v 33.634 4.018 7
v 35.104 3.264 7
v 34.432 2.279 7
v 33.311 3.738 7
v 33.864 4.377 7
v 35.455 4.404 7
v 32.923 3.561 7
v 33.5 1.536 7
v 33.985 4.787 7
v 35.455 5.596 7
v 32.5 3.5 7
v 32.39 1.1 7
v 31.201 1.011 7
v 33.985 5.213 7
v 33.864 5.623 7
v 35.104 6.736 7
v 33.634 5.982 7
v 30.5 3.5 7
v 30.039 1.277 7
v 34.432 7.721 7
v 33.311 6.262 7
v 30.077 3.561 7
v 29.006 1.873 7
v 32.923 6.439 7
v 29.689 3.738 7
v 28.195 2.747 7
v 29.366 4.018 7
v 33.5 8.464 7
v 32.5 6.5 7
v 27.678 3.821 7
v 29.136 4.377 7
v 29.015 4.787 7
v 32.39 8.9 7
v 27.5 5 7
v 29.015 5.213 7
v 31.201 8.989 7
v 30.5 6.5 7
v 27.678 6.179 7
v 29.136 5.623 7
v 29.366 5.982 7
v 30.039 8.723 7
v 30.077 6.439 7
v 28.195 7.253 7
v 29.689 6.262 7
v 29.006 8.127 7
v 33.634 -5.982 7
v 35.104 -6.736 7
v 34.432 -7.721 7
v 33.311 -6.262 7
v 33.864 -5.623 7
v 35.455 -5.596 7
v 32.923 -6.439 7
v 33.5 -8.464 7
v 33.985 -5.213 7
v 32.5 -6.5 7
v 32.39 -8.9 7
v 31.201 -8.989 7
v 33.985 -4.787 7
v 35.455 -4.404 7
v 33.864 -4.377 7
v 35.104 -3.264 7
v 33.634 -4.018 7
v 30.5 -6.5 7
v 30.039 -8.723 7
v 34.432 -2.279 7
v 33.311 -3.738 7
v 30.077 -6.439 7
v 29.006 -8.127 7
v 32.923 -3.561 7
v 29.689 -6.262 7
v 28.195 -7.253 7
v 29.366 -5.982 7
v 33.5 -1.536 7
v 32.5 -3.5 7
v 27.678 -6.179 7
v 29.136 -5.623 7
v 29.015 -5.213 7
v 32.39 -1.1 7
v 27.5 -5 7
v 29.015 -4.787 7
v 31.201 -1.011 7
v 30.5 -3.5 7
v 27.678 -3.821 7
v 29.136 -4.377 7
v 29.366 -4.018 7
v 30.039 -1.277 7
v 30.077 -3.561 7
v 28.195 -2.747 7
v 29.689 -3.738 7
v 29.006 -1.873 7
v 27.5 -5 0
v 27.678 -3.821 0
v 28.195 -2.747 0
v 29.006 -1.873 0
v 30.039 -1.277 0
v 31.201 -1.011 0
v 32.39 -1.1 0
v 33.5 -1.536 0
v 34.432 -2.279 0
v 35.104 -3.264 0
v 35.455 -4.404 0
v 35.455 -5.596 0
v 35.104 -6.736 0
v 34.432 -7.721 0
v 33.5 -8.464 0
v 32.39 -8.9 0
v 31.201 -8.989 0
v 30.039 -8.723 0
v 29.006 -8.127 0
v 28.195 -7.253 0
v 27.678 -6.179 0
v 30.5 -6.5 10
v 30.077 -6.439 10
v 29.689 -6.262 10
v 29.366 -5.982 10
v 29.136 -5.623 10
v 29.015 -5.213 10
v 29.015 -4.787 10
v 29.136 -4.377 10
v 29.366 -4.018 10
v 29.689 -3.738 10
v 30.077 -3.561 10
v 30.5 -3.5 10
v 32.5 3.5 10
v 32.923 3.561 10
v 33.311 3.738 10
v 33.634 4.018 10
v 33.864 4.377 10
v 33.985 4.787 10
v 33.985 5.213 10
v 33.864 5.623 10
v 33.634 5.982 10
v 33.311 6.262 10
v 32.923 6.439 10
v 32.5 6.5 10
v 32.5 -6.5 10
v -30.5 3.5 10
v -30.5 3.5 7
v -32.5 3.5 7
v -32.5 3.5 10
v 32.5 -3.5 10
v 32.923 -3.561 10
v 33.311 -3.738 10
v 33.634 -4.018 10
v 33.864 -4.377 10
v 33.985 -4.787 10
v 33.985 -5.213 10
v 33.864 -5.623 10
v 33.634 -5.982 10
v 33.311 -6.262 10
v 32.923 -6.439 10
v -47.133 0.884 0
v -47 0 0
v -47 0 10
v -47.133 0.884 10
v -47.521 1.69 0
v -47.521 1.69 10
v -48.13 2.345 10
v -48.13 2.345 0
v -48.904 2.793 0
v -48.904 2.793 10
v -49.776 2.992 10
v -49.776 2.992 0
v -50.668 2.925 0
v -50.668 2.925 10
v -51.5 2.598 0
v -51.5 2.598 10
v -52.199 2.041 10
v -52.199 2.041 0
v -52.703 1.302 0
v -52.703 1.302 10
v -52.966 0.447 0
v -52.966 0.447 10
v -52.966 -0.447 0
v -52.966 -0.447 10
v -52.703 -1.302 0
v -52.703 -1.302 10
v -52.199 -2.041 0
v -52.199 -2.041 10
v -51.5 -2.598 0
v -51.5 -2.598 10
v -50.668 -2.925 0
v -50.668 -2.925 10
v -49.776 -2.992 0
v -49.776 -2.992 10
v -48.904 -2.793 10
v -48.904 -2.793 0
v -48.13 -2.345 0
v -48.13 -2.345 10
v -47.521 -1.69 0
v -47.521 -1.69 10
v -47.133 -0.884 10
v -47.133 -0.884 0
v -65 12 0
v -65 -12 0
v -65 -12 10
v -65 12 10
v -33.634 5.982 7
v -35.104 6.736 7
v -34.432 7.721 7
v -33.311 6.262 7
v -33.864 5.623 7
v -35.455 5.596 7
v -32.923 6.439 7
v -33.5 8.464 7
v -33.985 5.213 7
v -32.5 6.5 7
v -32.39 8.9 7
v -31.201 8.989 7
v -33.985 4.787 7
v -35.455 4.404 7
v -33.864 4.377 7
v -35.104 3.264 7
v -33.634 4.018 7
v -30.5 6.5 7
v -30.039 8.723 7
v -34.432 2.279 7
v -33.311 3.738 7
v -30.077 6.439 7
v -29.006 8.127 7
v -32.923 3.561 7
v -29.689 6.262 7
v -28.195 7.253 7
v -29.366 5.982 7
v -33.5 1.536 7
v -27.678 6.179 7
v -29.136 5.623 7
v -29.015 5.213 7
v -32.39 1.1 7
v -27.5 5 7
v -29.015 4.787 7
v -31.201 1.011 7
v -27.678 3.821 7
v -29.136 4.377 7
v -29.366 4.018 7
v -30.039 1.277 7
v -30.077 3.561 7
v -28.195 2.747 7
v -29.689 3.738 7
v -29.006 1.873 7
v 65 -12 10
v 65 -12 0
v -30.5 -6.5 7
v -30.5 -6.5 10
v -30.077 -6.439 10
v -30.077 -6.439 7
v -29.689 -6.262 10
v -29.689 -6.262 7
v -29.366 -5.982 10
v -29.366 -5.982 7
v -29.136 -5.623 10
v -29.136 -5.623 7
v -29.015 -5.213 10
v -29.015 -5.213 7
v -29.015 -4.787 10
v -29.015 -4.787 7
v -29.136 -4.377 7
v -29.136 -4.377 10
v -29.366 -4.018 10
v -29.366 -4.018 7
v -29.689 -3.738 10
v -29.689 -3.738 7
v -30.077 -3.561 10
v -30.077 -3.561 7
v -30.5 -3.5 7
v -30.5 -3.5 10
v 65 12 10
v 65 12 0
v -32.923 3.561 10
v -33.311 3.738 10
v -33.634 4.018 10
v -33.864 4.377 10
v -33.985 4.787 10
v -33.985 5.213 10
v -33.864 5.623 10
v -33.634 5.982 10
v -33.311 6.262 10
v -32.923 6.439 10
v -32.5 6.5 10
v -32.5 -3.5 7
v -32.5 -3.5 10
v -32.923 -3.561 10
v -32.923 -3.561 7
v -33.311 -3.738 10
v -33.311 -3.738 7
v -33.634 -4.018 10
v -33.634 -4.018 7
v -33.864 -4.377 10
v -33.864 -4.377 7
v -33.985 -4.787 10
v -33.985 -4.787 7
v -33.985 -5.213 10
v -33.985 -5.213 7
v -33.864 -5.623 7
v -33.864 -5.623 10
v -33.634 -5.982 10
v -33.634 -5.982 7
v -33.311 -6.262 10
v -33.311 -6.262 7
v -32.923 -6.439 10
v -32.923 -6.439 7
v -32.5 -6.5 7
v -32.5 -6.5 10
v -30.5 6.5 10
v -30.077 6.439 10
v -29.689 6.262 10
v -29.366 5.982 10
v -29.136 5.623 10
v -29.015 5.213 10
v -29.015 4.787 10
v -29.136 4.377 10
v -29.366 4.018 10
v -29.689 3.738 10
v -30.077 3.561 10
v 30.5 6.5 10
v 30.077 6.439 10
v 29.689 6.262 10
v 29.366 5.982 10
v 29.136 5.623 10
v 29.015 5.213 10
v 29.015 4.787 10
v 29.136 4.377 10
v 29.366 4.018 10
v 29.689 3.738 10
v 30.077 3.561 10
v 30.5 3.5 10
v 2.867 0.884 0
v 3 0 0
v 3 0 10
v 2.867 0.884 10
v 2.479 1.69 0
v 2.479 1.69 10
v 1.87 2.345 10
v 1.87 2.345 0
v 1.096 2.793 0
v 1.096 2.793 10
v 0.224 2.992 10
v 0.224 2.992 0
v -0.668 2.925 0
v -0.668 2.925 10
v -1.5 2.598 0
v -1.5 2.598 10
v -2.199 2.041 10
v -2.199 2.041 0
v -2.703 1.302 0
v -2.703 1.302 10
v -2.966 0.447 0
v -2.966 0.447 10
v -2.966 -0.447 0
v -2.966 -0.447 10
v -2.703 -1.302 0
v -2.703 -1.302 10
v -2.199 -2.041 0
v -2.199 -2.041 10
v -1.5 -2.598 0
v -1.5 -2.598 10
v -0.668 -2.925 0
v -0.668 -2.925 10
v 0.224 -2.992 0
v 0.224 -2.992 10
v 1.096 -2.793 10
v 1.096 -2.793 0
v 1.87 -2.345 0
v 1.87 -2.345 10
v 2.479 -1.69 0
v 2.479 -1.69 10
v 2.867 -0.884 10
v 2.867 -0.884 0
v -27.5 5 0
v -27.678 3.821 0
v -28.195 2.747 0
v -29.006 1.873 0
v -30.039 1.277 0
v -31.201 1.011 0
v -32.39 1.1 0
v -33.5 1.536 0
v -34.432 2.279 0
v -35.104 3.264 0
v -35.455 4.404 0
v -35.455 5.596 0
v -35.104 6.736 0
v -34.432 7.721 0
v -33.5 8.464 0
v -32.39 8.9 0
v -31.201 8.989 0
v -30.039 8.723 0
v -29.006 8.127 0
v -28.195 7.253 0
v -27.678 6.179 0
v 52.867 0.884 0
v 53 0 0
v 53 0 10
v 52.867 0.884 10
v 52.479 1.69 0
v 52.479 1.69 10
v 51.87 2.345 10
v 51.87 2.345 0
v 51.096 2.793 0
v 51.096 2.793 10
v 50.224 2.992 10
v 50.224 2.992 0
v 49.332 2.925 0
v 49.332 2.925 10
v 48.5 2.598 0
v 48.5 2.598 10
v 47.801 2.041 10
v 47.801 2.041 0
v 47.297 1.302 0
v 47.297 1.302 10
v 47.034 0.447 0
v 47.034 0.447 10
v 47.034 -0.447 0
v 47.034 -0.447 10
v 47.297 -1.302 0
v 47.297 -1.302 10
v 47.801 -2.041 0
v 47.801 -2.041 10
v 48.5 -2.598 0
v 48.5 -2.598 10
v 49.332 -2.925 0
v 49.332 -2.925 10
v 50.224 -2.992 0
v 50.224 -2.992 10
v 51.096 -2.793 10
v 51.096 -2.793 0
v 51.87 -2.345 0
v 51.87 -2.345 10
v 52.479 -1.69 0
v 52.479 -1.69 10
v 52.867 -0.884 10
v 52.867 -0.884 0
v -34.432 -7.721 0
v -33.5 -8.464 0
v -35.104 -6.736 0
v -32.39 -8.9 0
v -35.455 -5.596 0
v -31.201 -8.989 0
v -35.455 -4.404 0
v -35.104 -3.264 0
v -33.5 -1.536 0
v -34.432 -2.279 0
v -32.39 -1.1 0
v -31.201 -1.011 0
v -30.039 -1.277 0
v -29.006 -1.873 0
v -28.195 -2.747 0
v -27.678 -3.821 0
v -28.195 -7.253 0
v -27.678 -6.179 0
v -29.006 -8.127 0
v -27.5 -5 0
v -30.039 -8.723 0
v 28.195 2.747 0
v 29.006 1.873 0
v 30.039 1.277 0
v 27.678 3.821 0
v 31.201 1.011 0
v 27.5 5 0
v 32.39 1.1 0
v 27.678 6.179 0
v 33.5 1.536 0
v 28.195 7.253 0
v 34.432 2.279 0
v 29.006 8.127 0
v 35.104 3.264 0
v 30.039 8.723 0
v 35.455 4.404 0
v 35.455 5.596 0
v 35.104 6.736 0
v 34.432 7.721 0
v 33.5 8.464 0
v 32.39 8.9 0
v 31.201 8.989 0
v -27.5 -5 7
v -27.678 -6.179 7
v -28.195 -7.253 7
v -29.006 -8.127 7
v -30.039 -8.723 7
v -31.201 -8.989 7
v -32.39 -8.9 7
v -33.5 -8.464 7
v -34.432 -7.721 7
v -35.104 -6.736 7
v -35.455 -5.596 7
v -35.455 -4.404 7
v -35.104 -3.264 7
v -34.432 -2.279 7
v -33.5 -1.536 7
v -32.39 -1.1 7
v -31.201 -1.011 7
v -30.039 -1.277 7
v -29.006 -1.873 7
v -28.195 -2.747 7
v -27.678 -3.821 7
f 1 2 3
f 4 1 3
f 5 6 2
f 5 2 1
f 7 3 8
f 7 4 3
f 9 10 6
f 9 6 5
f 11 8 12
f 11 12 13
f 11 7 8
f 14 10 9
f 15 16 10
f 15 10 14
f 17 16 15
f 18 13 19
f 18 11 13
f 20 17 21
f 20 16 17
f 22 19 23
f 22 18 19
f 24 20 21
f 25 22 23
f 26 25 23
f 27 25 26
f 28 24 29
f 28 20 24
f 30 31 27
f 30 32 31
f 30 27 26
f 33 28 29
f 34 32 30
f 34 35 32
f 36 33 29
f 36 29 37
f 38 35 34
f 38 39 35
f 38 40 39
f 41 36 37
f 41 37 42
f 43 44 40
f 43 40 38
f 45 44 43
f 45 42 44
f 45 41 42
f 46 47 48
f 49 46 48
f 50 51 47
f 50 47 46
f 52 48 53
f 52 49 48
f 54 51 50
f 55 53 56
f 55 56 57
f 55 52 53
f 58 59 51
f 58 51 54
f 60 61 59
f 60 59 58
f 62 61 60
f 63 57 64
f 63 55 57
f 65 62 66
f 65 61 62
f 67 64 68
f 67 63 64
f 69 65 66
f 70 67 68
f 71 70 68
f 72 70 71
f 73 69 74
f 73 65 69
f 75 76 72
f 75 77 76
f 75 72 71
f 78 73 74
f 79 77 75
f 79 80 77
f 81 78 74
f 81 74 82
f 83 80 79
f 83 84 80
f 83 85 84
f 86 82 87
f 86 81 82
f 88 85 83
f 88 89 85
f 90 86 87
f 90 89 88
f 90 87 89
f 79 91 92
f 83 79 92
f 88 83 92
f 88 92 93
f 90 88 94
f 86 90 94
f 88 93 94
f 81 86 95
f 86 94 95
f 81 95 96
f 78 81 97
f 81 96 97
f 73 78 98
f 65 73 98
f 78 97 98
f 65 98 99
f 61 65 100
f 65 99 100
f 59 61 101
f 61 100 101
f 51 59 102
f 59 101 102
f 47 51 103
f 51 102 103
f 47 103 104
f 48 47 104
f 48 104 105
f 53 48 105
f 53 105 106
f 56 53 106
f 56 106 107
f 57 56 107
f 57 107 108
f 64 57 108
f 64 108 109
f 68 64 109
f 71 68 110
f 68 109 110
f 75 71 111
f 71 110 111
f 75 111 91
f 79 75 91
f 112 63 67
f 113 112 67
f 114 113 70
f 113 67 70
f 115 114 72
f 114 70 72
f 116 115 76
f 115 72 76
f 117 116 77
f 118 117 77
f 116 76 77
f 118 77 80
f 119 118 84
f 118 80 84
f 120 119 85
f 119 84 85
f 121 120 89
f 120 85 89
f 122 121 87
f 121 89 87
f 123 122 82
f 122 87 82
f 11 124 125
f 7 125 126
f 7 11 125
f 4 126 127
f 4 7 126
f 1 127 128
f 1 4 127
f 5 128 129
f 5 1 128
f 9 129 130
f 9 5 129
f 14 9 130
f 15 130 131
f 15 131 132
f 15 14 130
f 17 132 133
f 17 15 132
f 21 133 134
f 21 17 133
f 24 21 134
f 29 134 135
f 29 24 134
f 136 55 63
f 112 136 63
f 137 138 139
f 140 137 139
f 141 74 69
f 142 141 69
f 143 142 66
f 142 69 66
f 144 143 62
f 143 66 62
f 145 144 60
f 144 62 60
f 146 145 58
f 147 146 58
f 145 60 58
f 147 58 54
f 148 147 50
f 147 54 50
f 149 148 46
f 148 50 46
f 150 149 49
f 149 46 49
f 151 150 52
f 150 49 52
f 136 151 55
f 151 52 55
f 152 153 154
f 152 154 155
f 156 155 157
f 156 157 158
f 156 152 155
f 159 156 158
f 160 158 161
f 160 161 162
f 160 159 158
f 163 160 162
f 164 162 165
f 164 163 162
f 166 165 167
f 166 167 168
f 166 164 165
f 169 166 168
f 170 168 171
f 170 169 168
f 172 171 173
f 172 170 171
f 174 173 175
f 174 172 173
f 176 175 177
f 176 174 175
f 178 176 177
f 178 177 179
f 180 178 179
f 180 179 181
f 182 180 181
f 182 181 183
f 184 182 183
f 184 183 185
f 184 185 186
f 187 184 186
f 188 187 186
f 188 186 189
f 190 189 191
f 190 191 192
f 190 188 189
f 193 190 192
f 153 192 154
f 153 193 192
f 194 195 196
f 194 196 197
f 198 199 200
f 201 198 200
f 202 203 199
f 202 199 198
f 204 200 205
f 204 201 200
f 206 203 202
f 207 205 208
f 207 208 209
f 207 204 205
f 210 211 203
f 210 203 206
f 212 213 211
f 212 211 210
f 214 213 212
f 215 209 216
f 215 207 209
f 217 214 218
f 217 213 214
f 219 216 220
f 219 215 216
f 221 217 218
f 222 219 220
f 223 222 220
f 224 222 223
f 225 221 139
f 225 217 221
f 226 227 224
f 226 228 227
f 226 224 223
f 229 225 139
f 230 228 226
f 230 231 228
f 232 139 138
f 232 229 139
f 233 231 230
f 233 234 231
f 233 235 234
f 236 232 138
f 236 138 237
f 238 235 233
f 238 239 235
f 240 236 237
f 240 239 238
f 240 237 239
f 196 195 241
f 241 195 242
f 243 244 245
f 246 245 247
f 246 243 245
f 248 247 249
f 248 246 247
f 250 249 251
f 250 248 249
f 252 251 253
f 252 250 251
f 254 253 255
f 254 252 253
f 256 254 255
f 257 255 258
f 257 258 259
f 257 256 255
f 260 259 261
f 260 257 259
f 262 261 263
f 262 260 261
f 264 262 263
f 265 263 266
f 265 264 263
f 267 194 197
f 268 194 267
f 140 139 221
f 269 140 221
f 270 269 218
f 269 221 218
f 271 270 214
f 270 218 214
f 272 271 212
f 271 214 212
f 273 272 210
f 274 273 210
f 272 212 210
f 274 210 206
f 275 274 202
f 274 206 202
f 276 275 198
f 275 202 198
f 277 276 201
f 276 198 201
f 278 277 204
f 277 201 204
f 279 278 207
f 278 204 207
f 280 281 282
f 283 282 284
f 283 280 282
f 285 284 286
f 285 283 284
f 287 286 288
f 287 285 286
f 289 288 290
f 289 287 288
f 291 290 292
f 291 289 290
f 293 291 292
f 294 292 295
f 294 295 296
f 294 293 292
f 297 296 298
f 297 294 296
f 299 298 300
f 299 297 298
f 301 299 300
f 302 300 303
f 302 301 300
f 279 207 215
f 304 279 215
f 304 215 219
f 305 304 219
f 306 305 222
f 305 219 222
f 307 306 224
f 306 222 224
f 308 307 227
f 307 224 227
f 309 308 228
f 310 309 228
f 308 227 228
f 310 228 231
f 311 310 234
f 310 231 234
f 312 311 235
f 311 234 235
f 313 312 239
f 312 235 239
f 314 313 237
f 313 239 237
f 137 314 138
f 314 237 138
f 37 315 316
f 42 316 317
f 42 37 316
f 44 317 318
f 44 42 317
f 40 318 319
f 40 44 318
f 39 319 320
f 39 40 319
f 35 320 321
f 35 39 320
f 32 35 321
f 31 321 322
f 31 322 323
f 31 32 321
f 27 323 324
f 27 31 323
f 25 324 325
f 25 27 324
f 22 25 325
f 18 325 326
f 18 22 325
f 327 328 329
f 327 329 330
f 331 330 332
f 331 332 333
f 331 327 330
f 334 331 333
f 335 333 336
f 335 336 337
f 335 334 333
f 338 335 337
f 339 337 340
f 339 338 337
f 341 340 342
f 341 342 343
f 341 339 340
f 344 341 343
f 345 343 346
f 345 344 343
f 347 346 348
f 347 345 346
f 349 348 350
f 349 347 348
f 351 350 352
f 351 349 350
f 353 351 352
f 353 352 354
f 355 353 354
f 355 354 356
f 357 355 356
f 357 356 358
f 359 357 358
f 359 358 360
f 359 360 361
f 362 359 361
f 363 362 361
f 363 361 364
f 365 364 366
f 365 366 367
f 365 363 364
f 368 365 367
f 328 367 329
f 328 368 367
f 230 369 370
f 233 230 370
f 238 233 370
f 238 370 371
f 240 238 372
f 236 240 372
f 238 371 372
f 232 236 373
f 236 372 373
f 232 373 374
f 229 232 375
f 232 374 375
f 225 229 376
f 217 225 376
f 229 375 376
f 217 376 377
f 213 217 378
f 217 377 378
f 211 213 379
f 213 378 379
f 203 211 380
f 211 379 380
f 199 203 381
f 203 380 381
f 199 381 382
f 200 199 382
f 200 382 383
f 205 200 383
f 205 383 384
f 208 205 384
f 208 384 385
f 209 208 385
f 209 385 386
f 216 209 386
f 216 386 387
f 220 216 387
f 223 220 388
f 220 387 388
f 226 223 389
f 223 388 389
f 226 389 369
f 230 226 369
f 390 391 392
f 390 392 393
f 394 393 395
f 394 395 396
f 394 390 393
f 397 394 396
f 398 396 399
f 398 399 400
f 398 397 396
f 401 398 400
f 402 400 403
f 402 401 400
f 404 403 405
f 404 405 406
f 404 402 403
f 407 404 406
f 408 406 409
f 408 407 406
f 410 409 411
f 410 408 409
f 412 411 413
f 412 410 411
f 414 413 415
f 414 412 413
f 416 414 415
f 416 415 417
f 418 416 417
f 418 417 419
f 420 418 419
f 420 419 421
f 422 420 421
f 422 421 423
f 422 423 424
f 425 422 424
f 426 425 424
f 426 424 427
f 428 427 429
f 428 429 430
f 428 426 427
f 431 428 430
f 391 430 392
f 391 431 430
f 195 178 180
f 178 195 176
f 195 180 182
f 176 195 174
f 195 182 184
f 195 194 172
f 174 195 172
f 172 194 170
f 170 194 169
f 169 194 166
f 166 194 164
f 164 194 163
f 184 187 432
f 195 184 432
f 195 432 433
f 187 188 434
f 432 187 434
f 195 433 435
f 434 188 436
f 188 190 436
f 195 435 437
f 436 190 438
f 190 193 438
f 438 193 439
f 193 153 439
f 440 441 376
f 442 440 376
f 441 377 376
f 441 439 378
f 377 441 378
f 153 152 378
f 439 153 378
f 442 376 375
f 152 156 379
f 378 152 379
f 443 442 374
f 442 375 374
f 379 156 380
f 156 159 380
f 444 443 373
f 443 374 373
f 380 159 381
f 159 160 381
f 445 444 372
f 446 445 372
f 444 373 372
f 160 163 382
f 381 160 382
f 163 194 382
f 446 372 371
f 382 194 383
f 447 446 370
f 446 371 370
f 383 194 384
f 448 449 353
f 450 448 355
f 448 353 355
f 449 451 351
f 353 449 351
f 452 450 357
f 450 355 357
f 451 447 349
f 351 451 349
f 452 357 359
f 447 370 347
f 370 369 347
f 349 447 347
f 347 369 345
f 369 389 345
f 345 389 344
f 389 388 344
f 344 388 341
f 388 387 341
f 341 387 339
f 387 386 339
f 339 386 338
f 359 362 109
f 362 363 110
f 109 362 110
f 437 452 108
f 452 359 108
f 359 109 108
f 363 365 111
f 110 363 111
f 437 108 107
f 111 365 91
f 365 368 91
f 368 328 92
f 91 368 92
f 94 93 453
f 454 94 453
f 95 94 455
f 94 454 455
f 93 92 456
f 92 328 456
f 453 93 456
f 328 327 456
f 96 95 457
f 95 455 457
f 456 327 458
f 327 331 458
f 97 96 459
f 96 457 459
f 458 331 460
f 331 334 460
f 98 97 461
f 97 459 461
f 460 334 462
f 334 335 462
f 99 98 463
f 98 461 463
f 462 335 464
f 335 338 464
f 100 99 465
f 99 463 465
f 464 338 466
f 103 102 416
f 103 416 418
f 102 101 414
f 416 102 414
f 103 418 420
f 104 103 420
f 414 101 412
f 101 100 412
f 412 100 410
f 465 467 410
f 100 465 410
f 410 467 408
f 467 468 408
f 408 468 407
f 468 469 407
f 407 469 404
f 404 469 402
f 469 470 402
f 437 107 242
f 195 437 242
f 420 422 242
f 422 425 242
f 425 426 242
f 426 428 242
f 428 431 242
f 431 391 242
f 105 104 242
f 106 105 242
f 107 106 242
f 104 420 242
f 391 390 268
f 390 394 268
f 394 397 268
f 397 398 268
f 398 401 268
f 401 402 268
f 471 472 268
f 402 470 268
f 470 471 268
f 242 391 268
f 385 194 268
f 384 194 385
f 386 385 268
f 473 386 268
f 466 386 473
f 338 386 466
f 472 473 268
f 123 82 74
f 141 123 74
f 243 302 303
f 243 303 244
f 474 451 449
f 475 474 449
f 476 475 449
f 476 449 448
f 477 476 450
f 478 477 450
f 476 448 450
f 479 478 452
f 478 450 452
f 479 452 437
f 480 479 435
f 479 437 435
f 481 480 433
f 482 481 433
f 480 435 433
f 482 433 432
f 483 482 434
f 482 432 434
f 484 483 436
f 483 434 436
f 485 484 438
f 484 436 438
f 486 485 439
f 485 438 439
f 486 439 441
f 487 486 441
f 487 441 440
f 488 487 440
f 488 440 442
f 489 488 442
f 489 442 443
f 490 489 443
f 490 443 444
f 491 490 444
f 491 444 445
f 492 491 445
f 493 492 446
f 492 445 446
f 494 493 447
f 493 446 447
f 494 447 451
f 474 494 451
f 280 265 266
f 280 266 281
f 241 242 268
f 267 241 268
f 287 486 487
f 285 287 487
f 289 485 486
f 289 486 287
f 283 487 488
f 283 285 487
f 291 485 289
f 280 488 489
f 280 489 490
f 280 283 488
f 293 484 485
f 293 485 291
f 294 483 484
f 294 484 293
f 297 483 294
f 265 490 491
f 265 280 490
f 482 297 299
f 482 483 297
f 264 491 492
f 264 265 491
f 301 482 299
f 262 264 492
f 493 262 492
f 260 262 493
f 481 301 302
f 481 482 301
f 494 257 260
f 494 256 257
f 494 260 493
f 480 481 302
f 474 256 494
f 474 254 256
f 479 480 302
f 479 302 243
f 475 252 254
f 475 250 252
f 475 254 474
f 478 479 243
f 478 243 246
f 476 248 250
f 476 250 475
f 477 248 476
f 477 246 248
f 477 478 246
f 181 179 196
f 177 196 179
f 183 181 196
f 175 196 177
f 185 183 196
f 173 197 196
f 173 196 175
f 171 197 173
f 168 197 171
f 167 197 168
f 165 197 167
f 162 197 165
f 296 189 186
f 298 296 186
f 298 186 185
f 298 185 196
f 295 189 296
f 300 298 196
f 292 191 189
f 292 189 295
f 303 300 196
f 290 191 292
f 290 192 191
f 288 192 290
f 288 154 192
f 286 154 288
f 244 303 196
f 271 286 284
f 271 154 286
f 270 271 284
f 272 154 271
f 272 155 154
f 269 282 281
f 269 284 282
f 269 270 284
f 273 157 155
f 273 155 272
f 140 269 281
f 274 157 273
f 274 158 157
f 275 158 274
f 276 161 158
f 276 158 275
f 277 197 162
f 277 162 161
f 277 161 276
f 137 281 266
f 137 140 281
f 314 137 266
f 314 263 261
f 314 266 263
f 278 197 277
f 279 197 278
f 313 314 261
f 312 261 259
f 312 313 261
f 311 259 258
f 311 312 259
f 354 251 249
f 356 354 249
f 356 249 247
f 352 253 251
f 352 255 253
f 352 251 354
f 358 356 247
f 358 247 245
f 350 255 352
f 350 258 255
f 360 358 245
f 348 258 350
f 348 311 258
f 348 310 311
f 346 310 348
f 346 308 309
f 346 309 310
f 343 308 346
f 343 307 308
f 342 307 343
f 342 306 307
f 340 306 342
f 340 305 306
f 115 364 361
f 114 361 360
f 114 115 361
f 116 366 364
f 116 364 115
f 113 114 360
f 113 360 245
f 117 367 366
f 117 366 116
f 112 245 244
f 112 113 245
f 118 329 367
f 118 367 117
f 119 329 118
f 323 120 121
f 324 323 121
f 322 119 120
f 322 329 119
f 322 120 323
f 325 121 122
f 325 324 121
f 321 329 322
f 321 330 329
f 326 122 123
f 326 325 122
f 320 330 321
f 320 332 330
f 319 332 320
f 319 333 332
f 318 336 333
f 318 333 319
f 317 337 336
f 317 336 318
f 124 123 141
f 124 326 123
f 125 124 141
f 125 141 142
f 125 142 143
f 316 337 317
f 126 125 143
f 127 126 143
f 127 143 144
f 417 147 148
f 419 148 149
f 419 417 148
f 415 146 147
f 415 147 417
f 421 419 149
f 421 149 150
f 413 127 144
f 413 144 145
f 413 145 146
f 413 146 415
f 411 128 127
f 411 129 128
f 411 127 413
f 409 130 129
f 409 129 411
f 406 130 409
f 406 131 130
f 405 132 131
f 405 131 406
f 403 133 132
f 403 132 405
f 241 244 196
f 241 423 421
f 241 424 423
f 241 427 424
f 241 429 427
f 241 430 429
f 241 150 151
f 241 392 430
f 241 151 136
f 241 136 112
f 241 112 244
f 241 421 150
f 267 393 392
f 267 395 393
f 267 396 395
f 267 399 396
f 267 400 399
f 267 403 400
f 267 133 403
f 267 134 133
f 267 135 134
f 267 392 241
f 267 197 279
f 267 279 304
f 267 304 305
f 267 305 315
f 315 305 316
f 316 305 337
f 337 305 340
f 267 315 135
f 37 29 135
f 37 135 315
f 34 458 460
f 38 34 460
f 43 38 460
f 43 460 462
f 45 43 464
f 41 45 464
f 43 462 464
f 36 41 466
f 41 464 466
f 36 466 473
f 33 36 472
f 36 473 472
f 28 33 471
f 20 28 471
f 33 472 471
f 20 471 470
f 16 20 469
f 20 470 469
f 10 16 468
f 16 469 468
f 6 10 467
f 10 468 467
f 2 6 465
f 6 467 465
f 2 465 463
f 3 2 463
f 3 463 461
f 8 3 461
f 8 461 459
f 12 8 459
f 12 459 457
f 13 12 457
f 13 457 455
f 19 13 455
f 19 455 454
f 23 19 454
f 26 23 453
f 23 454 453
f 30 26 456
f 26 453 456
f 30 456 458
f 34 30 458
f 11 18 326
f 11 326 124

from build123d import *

# Parameters (mm, degrees)
SKETCH_1_W          = 130
SKETCH_1_H          = 24
SKETCH_1_R          = 3
EXTRUDE_1_DEPTH     = 10
SKETCH_2_R          = 4
CUT_EXTRUDE_1_DEPTH = 7


with BuildPart() as part:
    # 草图1 → 凸台-拉伸1 (new body)
    with BuildSketch(Plane.XY):
        Rectangle(SKETCH_1_W, SKETCH_1_H)
        with Locations((-50, 0)):
            Circle(SKETCH_1_R, mode=Mode.SUBTRACT)
        with Locations((50, 0)):
            Circle(SKETCH_1_R, mode=Mode.SUBTRACT)
        Circle(SKETCH_1_R, mode=Mode.SUBTRACT)
        with BuildLine():
            Line((32.5, 6.5), (30.5, 6.5))
            ThreePointArc((30.5, 6.5), (29, 5), (30.5, 3.5))
            Line((30.5, 3.5), (32.5, 3.5))
            ThreePointArc((32.5, 3.5), (34, 5), (32.5, 6.5))
        make_face(mode=Mode.SUBTRACT)
        with BuildLine():
            Line((32.5, -6.5), (30.5, -6.5))
            ThreePointArc((30.5, -6.5), (29, -5), (30.5, -3.5))
            Line((30.5, -3.5), (32.5, -3.5))
            ThreePointArc((32.5, -3.5), (34, -5), (32.5, -6.5))
        make_face(mode=Mode.SUBTRACT)
        with BuildLine():
            Line((-32.5, 6.5), (-30.5, 6.5))
            ThreePointArc((-30.5, 6.5), (-29, 5), (-30.5, 3.5))
            Line((-30.5, 3.5), (-32.5, 3.5))
            ThreePointArc((-32.5, 3.5), (-34, 5), (-32.5, 6.5))
        make_face(mode=Mode.SUBTRACT)
        with BuildLine():
            Line((-32.5, -6.5), (-30.5, -6.5))
            ThreePointArc((-30.5, -6.5), (-29, -5), (-30.5, -3.5))
            Line((-30.5, -3.5), (-32.5, -3.5))
            ThreePointArc((-32.5, -3.5), (-34, -5), (-32.5, -6.5))
        make_face(mode=Mode.SUBTRACT)
    extrude(amount=EXTRUDE_1_DEPTH)

    # 草图2 → 切除-拉伸1 (cut)
    with BuildSketch(Plane(origin=(0, 0, 0), x_dir=(-1, 0, 0), z_dir=(0, 0, -1))):
        with Locations((-31.5, 5)):
            Circle(SKETCH_2_R)
        with Locations((-31.5, -5)):
            Circle(SKETCH_2_R)
        with Locations(Location((31.5, -5, 0), (0, 0, 180))):
            Circle(SKETCH_2_R)
        with Locations(Location((31.5, 5, 0), (0, 0, 180))):
            Circle(SKETCH_2_R)
    extrude(amount=-CUT_EXTRUDE_1_DEPTH, mode=Mode.SUBTRACT)


solid = part.part
